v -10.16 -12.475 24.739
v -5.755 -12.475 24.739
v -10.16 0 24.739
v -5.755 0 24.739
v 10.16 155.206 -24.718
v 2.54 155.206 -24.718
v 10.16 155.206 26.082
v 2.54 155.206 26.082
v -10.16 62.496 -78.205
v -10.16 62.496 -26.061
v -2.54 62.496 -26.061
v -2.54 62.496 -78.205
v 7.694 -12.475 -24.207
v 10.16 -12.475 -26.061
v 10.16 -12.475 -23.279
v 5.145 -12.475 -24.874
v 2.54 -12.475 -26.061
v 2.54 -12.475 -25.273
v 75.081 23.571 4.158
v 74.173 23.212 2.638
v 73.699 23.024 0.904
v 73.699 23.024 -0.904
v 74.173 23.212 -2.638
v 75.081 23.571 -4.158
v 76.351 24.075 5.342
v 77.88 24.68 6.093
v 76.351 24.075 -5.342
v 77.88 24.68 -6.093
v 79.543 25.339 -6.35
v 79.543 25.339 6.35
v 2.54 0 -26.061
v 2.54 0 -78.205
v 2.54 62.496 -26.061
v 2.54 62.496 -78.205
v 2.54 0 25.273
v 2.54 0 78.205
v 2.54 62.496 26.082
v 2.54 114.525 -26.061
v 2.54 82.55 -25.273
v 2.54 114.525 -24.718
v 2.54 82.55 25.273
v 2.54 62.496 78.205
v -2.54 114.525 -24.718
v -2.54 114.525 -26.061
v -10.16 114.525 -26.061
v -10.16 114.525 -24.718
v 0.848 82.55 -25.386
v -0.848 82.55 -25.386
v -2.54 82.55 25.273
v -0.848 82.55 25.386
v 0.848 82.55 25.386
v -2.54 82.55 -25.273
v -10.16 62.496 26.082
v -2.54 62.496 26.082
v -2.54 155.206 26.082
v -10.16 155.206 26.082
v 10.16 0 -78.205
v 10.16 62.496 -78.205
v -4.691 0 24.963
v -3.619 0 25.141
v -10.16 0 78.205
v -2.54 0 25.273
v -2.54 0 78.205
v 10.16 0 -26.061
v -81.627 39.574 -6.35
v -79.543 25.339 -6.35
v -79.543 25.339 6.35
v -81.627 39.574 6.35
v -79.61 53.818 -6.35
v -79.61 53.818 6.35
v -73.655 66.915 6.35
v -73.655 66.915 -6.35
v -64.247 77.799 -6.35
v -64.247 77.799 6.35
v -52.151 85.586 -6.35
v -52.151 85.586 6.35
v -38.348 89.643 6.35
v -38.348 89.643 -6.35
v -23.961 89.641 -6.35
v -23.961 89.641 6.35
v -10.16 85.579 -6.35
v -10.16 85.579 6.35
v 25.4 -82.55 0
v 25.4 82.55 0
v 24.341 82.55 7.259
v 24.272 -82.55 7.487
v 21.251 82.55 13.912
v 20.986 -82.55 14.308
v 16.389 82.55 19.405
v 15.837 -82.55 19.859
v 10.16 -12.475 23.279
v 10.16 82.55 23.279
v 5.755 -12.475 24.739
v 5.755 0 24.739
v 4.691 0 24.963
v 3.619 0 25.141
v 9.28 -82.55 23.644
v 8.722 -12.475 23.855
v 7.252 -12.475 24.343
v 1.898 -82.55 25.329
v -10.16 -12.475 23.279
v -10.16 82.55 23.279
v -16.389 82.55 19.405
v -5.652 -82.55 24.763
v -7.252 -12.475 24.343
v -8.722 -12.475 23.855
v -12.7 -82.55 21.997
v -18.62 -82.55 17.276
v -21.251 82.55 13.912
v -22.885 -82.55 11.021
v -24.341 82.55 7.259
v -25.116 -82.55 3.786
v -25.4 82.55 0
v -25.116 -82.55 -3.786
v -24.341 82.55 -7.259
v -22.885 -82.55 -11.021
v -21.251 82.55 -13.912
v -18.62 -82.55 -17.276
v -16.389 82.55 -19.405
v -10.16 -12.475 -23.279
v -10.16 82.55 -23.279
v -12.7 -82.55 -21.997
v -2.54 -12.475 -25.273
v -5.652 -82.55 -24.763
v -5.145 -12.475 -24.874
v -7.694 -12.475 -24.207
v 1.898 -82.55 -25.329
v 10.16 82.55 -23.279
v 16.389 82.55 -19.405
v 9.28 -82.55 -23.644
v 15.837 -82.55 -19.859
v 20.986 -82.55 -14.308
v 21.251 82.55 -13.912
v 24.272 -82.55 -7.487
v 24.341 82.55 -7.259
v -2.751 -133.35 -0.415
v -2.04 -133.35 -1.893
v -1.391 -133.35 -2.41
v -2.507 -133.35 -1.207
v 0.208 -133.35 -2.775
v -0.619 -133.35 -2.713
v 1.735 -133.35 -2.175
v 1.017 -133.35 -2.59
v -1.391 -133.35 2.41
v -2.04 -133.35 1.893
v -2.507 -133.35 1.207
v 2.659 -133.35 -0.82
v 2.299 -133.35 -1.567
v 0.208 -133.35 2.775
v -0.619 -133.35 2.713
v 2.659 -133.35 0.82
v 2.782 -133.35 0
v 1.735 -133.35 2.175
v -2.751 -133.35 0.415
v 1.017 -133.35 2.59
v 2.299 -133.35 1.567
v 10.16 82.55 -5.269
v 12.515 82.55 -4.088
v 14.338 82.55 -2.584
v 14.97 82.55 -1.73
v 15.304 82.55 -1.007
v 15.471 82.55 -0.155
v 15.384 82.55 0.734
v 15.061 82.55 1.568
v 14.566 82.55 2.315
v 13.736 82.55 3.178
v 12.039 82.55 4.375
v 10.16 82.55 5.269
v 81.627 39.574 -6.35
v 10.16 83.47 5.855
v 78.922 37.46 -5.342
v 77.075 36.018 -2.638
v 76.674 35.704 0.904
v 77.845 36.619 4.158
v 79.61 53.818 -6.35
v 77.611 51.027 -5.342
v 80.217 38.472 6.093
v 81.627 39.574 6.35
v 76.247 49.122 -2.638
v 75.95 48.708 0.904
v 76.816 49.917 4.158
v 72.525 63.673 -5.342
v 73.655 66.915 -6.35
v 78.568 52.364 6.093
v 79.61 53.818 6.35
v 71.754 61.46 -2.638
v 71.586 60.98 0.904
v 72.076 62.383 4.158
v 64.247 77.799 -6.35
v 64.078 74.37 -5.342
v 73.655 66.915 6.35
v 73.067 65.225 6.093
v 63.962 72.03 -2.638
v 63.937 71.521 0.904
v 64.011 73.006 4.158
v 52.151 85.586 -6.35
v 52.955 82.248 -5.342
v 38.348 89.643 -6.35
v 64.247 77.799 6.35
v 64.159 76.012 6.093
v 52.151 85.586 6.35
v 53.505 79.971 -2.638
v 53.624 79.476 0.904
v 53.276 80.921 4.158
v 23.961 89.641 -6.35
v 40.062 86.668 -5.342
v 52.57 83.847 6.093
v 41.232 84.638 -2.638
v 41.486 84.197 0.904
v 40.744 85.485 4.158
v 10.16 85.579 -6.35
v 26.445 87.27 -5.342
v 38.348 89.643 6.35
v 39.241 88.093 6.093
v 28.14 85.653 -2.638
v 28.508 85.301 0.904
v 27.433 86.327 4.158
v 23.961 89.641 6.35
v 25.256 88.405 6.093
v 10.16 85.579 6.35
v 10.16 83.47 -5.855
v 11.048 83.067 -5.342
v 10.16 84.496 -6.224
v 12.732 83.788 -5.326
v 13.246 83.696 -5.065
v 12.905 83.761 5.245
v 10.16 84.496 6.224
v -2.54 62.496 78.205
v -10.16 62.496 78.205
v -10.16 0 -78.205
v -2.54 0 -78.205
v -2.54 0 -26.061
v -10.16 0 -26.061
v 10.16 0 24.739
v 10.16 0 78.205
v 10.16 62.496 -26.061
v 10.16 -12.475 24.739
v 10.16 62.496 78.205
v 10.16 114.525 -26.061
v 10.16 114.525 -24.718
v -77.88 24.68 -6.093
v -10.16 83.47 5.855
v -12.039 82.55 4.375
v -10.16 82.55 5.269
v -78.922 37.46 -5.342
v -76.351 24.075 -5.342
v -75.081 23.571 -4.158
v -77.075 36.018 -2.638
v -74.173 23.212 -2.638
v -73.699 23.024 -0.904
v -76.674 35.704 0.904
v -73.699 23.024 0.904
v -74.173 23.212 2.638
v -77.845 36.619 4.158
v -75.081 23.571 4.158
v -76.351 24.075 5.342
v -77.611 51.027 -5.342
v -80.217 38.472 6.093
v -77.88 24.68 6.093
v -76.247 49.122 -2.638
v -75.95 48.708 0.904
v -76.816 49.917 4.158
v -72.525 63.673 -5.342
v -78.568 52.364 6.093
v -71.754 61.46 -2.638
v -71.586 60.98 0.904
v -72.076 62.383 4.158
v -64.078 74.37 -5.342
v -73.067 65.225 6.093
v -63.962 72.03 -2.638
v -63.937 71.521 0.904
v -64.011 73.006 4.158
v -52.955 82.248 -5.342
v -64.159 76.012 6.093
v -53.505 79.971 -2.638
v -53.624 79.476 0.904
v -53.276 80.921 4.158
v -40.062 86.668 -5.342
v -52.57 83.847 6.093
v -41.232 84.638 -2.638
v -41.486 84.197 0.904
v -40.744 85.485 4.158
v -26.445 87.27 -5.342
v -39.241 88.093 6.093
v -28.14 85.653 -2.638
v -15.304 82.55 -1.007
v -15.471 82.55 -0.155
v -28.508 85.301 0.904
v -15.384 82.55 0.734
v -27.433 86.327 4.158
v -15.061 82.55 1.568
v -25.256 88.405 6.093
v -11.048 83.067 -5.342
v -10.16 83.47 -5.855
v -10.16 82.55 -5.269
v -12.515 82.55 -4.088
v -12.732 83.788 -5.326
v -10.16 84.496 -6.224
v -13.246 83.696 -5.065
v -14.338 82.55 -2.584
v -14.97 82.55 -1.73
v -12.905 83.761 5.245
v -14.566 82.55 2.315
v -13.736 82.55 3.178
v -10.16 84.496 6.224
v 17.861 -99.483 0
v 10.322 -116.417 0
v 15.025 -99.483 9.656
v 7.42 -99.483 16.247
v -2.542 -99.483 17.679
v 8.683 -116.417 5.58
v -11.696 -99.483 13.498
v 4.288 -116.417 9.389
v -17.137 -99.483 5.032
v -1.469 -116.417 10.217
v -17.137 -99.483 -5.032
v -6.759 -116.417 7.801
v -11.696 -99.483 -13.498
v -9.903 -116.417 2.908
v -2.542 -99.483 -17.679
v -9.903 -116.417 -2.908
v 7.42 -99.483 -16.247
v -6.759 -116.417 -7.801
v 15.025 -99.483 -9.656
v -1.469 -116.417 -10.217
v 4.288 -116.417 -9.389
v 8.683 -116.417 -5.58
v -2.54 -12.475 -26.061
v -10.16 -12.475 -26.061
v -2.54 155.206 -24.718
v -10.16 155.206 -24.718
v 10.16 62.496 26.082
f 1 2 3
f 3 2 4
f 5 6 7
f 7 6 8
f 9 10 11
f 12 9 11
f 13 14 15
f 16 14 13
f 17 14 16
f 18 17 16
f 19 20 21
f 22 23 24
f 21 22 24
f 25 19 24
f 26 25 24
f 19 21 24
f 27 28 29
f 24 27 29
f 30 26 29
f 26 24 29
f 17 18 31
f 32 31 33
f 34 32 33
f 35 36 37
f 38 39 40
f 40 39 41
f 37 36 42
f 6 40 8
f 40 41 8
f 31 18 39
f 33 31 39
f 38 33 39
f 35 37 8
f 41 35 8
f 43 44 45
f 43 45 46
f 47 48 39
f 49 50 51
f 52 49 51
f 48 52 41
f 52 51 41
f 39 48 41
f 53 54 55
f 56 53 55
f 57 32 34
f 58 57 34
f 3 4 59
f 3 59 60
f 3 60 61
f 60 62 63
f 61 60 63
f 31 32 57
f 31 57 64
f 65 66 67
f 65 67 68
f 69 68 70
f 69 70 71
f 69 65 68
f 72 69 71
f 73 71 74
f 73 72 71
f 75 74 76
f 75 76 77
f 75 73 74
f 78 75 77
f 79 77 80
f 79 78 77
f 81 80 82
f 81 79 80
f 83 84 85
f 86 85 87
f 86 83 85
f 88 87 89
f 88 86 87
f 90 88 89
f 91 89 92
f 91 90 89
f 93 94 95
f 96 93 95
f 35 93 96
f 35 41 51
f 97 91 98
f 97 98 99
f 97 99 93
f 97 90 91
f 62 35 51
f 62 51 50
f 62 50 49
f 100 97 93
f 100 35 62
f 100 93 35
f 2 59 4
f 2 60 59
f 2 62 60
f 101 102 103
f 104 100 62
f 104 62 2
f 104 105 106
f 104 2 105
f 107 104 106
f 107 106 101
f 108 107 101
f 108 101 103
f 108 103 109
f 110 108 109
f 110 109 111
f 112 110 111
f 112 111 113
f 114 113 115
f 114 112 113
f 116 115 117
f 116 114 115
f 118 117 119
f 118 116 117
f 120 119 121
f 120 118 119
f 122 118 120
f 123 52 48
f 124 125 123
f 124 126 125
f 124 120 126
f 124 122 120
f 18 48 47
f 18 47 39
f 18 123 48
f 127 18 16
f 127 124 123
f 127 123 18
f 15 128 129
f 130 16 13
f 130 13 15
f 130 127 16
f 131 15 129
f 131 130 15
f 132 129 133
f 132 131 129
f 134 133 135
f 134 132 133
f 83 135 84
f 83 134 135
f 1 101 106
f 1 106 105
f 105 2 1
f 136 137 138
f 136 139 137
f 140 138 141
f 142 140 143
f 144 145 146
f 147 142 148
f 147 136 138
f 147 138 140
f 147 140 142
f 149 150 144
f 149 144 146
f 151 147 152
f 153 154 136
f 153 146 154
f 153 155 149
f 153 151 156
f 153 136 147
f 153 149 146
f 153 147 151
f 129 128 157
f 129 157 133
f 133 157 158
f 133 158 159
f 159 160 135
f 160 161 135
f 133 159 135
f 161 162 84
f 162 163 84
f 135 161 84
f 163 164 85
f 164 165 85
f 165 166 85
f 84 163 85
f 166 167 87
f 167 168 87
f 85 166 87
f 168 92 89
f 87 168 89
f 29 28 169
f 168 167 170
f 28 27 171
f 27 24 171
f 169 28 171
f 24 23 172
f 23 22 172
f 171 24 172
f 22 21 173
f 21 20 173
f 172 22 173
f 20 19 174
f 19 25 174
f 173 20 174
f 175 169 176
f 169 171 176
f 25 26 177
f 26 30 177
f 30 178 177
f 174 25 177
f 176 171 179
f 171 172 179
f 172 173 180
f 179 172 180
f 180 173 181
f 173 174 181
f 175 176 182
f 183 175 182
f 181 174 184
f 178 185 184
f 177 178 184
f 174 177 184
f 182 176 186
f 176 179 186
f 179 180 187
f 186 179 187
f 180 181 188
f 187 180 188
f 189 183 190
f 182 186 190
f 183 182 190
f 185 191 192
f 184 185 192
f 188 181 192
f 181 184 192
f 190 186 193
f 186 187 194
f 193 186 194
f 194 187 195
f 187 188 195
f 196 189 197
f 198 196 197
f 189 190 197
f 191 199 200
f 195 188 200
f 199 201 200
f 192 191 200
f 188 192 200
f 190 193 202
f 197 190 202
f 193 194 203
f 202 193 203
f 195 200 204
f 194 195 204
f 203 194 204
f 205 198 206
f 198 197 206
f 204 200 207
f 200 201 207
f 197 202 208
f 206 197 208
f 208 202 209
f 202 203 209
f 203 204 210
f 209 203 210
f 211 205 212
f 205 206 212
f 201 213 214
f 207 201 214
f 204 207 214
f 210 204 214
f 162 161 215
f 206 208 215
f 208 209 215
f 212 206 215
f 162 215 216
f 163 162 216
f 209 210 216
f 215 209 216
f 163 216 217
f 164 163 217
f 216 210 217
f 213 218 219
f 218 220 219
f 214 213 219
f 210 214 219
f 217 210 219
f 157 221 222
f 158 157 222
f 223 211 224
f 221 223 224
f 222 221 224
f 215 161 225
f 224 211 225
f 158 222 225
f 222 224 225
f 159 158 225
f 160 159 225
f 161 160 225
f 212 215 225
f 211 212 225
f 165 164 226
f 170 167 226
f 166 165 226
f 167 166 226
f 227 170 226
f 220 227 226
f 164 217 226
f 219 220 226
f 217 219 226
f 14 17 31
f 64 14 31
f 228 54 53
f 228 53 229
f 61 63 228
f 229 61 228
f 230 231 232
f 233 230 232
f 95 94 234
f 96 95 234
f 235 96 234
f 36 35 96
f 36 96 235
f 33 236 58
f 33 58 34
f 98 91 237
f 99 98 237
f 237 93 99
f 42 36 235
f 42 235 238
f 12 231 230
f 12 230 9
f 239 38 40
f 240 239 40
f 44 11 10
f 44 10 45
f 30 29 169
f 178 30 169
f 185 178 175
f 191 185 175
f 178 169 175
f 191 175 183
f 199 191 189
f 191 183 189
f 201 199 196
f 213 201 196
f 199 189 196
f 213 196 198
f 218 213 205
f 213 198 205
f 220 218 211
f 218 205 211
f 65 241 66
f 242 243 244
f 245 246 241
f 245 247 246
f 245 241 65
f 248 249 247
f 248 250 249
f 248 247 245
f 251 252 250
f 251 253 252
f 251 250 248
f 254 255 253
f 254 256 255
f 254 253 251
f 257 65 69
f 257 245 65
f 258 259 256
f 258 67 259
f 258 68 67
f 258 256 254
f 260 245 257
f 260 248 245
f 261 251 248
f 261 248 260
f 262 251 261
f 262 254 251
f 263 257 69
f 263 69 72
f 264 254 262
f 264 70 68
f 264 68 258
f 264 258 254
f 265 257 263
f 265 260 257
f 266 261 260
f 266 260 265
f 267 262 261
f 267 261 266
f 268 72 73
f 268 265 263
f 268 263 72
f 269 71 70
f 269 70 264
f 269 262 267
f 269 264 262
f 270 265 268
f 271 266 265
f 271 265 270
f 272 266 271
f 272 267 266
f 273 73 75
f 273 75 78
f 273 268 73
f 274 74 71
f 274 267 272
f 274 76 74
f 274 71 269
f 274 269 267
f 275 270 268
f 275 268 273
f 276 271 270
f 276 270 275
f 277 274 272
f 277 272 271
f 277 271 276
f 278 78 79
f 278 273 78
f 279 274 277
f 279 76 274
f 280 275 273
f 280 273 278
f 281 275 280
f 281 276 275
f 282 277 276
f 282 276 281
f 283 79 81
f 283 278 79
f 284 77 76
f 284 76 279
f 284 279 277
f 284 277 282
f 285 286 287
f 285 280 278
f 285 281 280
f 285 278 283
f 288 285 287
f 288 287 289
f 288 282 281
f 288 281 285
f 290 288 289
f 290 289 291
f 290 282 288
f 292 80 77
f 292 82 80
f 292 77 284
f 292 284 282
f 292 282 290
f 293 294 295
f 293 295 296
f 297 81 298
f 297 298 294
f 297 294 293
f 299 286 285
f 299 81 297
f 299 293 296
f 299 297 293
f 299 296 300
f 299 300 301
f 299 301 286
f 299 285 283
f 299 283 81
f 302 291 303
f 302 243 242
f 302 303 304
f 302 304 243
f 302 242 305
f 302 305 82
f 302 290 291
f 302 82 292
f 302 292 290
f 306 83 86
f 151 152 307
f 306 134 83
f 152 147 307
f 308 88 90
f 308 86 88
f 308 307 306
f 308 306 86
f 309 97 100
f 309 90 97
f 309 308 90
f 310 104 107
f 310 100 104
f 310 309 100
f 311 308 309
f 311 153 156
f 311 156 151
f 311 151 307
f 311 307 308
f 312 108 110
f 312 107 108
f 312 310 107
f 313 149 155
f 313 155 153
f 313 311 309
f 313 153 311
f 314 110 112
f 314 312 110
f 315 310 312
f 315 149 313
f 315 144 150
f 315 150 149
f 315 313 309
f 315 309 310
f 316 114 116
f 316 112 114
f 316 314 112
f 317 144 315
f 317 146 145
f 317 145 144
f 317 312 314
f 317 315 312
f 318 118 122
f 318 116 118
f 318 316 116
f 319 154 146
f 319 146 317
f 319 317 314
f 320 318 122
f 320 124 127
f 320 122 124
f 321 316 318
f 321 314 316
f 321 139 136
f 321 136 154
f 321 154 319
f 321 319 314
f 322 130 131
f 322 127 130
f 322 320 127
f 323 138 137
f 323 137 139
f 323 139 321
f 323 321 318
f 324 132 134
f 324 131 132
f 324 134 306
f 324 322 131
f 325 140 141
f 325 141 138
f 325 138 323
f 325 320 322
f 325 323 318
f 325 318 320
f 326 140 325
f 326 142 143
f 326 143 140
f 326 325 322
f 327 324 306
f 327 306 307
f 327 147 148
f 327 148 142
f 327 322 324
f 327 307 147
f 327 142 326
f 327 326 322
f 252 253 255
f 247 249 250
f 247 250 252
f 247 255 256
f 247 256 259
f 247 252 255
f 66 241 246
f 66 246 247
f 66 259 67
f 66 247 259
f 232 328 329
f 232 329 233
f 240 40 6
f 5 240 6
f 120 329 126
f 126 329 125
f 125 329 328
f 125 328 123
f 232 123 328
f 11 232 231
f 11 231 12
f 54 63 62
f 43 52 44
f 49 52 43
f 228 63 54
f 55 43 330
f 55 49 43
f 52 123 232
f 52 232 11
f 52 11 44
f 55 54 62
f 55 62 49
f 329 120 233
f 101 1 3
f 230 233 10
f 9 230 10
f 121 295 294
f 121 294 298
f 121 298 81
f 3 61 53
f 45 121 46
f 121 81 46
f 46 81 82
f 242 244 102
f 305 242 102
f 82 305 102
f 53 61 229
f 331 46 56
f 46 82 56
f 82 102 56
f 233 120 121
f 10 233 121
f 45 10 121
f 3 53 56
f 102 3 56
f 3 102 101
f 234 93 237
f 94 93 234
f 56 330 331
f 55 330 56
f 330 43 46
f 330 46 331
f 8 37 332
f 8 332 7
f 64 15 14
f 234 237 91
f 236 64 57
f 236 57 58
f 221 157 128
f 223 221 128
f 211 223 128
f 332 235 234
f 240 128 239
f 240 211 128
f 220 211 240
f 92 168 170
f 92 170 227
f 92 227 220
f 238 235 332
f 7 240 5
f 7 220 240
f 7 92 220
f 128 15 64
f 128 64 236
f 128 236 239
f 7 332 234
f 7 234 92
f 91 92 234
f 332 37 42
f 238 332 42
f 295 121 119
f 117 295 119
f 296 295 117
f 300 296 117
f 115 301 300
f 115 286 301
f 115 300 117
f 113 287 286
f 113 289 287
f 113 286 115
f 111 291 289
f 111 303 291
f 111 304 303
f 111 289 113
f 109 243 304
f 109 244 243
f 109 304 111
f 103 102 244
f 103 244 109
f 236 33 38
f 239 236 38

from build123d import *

# Parameters (mm, degrees)
F0_W      = 24.6273766255
F0_H      = 152.4
F3_R      = 25.4
F4_DEPTH  = 82.55
F8_W      = 62.4961581021
F8_H      = 152.4
F9_DEPTH  = 7.62
F11_W     = 127
F11_H     = 50.8
F12_DEPTH = 7.62
F13_W     = 152.4
F13_H     = 76.2
F14_DEPTH = 7.62
F15_R     = 25.4
F16_DEPTH = 50.8
F16_TAPER = 24
F17_DEPTH = 25.4


with BuildPart() as f1:
    # F0 (on Top) → F1 (revolve)
    with BuildSketch(Plane.XY):
        with Locations((1.4390293509, 0)):
            Rectangle(F0_W, F0_H)
    revolve(axis=Axis((13.7527176636, 0, 0), (0, -1, 0)))


with BuildPart() as f4:
    # F3 (on Front) → F4 (new body, symmetric)
    with BuildSketch(Plane.XZ):
        Circle(F3_R)
    extrude(amount=F4_DEPTH, both=True)

    # F8 (on offset) → F9 (join)
    with BuildSketch(Plane.YZ.offset(2.54)):
        with Locations((31.2480790511, 2.0054676748)):
            Rectangle(F8_W, F8_H)
    extrude(amount=F9_DEPTH)

    # F10: F4 across plane


with BuildPart() as f4_1:
    add(f4.part)
    add(f4.part.mirror(Plane.XY))

    # F11 (on offset) → F12 (join)
    with BuildSketch(Plane.YZ.offset(2.54)):
        with Locations((51.0253053619, -0.6605200469)):
            Rectangle(F11_W, F11_H)
    extrude(amount=F12_DEPTH)

    # F13 (on offset) → F14 (join)
    with BuildSketch(Plane.YZ.offset(2.54)):
        with Locations((79.006247285, 13.3819643736)):
            Rectangle(F13_W, F13_H)
    extrude(amount=F14_DEPTH)

    # F15 (on face) → F16 (join)
    with BuildSketch(Plane.XZ.offset(82.55)):
        Circle(F15_R)
    extrude(amount=F16_DEPTH, taper=F16_TAPER)

    # F17 (cut): faces of the model
    f17_faces = [f4_1.faces().sort_by_distance(p)[0] for p in [
        (6.35, 108.8512026936, 51.4819643736),
        (6.35, 88.510731732, -26.0605200469),
    ]]
    extrude(f17_faces, amount=-F17_DEPTH, dir=(0, 0, 1), mode=Mode.SUBTRACT)

    # F20: sweep along a path in F18
    with BuildLine(Plane.XY) as f20_path:
        ThreePointArc((79.5428454876, 25.338916108), (15.8456347969, 87.7762718464), (0, 0))
    # F19 (on Right) → F20 (sweep)
    with BuildSketch(Plane.YZ):
        with BuildLine():
            ThreePointArc((0, -6.35), (6.35, 0), (0, 6.35))
            Line((0, 6.35), (0, -6.35))
        make_face()
    sweep(path=f20_path.line)

    # F21: F4 across plane


with BuildPart() as f4_2:
    add(f4_1.part)
    add(f4_1.part.mirror(Plane.YZ))


solid = f4_2.part
